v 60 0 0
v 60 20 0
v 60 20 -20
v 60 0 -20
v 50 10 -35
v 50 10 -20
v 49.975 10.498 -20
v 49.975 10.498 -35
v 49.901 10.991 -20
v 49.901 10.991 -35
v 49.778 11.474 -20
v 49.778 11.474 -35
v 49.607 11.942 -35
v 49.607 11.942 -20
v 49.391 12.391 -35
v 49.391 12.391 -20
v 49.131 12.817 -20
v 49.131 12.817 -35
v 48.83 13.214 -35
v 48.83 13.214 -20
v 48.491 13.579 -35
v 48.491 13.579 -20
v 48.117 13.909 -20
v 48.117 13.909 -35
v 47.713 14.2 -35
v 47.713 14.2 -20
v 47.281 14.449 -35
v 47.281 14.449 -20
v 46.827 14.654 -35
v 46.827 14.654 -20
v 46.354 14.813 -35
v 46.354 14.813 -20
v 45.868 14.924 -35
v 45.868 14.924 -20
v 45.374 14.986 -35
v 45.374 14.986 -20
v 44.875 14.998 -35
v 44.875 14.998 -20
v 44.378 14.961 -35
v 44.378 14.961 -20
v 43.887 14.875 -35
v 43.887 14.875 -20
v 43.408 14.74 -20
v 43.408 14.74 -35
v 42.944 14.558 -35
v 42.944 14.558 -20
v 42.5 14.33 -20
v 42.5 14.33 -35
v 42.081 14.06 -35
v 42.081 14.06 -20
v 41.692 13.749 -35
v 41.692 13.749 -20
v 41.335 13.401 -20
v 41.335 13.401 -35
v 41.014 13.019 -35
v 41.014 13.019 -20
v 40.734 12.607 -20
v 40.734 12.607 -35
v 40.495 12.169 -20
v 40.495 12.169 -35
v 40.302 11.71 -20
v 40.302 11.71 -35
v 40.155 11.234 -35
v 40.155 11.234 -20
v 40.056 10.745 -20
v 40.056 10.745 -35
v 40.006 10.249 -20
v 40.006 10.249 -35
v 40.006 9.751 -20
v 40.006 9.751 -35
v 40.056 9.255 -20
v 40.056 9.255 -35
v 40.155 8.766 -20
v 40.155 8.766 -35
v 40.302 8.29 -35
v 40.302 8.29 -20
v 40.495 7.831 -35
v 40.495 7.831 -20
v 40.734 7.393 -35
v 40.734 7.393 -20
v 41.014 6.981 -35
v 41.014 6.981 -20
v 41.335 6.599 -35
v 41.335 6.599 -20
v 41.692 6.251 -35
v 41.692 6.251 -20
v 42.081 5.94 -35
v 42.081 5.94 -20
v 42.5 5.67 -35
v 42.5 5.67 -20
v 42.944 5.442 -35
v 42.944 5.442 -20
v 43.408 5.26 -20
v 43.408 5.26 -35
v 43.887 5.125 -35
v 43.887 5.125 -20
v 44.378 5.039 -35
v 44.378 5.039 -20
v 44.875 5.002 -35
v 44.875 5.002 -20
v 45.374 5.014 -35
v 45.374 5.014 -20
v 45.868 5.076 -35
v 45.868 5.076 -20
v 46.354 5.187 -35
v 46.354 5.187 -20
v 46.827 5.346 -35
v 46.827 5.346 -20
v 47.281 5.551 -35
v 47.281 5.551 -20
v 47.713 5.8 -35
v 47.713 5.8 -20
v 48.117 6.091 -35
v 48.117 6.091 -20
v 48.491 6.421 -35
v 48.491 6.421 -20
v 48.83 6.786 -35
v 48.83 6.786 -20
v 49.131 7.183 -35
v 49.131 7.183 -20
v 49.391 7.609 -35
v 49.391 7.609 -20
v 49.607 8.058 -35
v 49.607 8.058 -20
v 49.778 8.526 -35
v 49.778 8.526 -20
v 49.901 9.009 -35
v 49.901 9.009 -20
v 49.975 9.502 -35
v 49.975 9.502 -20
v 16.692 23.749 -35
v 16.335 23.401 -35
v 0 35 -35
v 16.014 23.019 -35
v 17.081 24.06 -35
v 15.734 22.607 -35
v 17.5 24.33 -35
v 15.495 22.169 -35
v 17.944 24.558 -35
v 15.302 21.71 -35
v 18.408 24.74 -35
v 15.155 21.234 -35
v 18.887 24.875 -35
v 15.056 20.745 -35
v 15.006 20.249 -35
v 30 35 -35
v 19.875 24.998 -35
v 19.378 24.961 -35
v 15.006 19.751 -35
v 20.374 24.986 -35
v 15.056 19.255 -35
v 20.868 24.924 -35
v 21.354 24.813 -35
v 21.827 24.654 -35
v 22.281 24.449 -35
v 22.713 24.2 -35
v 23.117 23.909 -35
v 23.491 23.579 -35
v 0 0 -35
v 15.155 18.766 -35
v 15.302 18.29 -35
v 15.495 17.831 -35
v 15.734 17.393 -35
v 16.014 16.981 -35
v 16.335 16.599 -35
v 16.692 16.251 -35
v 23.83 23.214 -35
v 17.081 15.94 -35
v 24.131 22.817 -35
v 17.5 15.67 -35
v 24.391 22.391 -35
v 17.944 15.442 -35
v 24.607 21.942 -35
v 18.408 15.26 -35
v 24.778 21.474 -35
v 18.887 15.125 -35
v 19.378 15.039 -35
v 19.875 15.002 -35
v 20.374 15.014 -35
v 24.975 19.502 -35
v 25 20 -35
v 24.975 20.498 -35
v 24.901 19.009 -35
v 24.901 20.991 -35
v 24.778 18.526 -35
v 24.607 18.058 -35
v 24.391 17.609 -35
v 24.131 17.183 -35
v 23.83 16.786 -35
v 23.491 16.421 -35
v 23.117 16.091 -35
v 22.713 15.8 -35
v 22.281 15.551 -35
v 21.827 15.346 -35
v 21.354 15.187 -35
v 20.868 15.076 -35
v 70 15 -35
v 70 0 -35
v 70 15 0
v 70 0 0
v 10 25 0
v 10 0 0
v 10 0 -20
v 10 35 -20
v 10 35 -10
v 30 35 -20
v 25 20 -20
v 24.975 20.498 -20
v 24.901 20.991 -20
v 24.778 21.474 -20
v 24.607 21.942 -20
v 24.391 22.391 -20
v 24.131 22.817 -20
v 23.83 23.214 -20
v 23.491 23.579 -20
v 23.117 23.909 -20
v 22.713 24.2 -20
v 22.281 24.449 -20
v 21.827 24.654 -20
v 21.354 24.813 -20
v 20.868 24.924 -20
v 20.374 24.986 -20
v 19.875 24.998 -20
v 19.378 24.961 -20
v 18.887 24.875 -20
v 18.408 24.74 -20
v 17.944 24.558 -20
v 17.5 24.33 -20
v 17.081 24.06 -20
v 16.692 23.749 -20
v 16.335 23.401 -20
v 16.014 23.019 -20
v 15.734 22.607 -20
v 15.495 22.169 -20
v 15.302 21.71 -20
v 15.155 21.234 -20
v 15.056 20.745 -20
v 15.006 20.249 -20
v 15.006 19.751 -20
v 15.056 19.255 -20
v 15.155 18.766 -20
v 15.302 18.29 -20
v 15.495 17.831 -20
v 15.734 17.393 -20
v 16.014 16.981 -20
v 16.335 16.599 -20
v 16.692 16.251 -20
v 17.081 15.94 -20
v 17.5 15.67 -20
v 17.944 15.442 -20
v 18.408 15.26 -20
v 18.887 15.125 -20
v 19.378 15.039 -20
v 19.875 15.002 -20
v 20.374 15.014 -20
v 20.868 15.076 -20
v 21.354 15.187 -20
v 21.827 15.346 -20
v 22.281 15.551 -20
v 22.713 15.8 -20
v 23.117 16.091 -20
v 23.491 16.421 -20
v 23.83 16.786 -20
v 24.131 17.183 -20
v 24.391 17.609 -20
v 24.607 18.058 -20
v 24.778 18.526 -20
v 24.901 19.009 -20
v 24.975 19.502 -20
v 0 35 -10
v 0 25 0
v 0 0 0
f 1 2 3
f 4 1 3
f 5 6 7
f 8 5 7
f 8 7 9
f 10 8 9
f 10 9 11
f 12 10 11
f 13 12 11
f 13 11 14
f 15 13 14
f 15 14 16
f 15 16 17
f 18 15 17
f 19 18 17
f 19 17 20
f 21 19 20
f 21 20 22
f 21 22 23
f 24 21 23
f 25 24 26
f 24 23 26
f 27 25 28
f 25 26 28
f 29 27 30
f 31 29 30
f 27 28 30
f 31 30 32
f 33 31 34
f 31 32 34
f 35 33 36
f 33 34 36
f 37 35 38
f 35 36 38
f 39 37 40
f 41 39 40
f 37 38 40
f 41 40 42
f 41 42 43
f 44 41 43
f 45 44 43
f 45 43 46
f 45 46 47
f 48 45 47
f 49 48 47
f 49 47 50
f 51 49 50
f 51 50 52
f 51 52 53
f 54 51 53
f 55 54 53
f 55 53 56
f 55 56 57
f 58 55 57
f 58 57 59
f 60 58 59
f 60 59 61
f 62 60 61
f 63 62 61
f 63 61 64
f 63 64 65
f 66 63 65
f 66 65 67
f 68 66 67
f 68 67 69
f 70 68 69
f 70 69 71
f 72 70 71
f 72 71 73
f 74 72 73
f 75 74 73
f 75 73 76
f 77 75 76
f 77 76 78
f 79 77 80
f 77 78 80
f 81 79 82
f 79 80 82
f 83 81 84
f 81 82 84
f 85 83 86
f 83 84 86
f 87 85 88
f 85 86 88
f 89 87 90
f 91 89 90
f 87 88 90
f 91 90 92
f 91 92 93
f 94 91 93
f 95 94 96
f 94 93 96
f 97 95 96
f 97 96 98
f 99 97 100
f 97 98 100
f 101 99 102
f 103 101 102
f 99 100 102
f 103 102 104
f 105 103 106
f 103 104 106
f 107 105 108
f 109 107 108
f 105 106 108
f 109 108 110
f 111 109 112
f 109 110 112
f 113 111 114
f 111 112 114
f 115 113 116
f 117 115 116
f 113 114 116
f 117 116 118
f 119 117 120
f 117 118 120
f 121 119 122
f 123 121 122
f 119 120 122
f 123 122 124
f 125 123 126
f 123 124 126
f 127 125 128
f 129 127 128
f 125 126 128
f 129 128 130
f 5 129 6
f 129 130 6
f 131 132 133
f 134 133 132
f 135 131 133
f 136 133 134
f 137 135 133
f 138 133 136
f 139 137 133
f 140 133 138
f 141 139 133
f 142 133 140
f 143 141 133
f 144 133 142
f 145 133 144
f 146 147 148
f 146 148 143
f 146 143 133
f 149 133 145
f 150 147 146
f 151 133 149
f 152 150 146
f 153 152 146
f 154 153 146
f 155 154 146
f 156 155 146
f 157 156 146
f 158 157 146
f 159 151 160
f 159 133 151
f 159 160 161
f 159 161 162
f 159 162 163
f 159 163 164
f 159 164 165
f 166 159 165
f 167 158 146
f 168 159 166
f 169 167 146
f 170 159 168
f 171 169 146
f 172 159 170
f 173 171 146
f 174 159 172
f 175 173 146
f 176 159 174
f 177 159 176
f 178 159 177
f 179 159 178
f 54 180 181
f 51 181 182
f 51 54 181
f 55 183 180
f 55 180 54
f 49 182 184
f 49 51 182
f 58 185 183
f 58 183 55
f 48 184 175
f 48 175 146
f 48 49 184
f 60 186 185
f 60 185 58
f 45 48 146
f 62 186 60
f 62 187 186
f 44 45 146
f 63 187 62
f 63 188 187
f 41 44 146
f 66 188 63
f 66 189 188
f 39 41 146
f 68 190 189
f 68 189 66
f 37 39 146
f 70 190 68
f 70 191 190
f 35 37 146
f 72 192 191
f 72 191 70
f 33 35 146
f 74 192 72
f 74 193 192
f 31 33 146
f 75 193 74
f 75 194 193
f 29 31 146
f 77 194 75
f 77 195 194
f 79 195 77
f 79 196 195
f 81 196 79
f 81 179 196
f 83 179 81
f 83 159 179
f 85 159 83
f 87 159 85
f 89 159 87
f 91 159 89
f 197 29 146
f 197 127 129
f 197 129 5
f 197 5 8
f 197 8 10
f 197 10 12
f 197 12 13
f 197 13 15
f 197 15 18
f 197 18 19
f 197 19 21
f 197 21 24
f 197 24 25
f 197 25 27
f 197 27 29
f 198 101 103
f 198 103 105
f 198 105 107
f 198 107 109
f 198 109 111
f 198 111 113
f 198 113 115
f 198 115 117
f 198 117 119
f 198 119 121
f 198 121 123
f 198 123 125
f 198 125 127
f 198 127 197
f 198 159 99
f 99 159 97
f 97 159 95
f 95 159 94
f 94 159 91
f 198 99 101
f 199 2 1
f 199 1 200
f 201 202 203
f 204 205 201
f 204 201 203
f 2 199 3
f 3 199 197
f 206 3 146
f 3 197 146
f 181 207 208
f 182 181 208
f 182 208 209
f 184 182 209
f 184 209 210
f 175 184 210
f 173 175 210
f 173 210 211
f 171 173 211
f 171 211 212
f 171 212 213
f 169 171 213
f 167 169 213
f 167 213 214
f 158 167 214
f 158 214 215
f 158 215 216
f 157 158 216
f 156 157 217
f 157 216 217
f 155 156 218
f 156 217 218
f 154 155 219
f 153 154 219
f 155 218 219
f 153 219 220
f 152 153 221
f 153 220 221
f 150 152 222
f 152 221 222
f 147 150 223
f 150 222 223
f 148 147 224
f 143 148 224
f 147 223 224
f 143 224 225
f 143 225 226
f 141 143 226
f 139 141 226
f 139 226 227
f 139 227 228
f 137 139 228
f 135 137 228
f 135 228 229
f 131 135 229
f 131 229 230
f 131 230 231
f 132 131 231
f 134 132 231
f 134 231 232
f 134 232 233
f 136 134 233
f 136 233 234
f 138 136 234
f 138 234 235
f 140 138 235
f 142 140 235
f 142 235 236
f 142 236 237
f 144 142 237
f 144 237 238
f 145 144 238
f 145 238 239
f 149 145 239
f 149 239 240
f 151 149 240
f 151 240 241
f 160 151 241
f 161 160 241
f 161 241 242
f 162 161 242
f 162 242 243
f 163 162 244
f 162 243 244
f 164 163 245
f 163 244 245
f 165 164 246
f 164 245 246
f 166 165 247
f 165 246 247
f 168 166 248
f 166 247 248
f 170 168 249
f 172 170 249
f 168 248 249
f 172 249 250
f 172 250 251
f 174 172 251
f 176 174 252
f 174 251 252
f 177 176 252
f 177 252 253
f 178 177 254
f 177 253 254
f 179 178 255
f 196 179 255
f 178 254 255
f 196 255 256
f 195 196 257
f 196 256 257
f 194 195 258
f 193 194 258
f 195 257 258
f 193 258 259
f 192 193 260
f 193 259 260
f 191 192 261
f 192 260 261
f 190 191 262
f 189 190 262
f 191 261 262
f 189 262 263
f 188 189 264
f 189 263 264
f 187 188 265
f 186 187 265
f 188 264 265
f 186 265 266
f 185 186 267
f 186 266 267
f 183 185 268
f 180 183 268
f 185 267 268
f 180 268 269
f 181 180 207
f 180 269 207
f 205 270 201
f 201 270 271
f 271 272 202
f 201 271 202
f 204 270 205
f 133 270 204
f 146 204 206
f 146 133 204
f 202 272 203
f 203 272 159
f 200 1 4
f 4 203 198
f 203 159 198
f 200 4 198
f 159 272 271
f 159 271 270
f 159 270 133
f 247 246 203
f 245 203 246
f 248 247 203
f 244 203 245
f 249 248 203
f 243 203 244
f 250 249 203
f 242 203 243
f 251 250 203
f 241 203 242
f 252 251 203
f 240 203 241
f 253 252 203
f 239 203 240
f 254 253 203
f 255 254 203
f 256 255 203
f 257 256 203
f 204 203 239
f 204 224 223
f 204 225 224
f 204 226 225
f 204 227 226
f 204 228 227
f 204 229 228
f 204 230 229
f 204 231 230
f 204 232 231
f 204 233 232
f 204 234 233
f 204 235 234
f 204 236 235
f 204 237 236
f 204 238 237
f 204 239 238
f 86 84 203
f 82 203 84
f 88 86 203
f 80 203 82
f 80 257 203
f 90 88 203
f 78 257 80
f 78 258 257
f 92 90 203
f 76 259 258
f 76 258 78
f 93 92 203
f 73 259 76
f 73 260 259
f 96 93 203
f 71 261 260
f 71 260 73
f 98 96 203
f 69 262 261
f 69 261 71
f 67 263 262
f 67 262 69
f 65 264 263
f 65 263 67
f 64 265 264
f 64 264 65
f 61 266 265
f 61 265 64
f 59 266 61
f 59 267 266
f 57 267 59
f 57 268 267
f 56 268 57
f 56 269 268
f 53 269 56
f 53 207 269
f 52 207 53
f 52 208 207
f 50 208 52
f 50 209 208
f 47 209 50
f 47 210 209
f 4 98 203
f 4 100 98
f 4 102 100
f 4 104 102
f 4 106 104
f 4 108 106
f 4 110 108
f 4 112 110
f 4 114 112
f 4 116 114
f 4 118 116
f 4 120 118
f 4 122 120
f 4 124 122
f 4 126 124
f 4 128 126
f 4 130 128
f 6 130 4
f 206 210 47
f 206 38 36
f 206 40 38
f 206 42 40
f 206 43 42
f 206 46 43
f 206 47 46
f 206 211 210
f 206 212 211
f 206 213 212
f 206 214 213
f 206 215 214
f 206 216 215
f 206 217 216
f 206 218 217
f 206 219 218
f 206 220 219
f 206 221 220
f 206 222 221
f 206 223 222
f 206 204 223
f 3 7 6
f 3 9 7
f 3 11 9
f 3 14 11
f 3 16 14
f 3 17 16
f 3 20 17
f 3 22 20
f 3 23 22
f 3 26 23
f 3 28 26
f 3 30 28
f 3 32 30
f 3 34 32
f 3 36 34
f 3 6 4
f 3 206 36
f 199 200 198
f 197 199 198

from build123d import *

# Parameters (mm, degrees)
SKETCH1_W           = 70
SKETCH1_H           = 35
BOSS_EXTRUDE1_DEPTH = 35
SKETCH2_W           = 50
SKETCH2_H           = 20
CUT_EXTRUDE1_DEPTH  = 36
CUT_EXTRUDE2_DEPTH  = 36
CUT_EXTRUDE3_DEPTH  = 35
SKETCH5_R           = 5
CUT_EXTRUDE4_DEPTH  = 35
SKETCH6_R           = 5
CUT_EXTRUDE5_DEPTH  = 35


with BuildPart() as part:
    # Sketch1 → Boss-Extrude1 (new body)
    with BuildSketch(Plane(origin=(0, 0, 0), x_dir=(1, 0, 0), z_dir=(0, 1, 0))):
        with Locations((35, 17.5)):
            Rectangle(SKETCH1_W, SKETCH1_H)
    extrude(amount=BOSS_EXTRUDE1_DEPTH)

    # Sketch2 → Cut-Extrude1 (cut, through all)
    with BuildSketch(Plane(origin=(0, 35, 0), x_dir=(1, 0, 0), z_dir=(0, 1, 0))):
        with Locations((35, 10)):
            Rectangle(SKETCH2_W, SKETCH2_H)
    extrude(amount=-CUT_EXTRUDE1_DEPTH, mode=Mode.SUBTRACT)

    # Sketch3 → Cut-Extrude2 (cut, through all)
    with BuildSketch(Plane(origin=(0, 0, -35), x_dir=(-1, 0, 0), z_dir=(0, 0, -1))):
        Polygon((-70, 35), (-70, 15), (-30, 35), align=None)
    extrude(amount=-CUT_EXTRUDE2_DEPTH, mode=Mode.SUBTRACT)

    # Sketch4 → Cut-Extrude3 (cut)
    with BuildSketch(Plane.ZY):
        Polygon((0, 35), (-10, 35), (0, 25), align=None)
    extrude(amount=-CUT_EXTRUDE3_DEPTH, mode=Mode.SUBTRACT)

    # Sketch5 → Cut-Extrude4 (cut)
    with BuildSketch(Plane.XY.offset(-20)):
        with Locations((20, 20)):
            Circle(SKETCH5_R)
    extrude(amount=-CUT_EXTRUDE4_DEPTH, mode=Mode.SUBTRACT)

    # Sketch6 → Cut-Extrude5 (cut)
    with BuildSketch(Plane.XY.offset(-20)):
        with Locations((45, 10)):
            Circle(SKETCH6_R)
    extrude(amount=-CUT_EXTRUDE5_DEPTH, mode=Mode.SUBTRACT)


solid = part.part
